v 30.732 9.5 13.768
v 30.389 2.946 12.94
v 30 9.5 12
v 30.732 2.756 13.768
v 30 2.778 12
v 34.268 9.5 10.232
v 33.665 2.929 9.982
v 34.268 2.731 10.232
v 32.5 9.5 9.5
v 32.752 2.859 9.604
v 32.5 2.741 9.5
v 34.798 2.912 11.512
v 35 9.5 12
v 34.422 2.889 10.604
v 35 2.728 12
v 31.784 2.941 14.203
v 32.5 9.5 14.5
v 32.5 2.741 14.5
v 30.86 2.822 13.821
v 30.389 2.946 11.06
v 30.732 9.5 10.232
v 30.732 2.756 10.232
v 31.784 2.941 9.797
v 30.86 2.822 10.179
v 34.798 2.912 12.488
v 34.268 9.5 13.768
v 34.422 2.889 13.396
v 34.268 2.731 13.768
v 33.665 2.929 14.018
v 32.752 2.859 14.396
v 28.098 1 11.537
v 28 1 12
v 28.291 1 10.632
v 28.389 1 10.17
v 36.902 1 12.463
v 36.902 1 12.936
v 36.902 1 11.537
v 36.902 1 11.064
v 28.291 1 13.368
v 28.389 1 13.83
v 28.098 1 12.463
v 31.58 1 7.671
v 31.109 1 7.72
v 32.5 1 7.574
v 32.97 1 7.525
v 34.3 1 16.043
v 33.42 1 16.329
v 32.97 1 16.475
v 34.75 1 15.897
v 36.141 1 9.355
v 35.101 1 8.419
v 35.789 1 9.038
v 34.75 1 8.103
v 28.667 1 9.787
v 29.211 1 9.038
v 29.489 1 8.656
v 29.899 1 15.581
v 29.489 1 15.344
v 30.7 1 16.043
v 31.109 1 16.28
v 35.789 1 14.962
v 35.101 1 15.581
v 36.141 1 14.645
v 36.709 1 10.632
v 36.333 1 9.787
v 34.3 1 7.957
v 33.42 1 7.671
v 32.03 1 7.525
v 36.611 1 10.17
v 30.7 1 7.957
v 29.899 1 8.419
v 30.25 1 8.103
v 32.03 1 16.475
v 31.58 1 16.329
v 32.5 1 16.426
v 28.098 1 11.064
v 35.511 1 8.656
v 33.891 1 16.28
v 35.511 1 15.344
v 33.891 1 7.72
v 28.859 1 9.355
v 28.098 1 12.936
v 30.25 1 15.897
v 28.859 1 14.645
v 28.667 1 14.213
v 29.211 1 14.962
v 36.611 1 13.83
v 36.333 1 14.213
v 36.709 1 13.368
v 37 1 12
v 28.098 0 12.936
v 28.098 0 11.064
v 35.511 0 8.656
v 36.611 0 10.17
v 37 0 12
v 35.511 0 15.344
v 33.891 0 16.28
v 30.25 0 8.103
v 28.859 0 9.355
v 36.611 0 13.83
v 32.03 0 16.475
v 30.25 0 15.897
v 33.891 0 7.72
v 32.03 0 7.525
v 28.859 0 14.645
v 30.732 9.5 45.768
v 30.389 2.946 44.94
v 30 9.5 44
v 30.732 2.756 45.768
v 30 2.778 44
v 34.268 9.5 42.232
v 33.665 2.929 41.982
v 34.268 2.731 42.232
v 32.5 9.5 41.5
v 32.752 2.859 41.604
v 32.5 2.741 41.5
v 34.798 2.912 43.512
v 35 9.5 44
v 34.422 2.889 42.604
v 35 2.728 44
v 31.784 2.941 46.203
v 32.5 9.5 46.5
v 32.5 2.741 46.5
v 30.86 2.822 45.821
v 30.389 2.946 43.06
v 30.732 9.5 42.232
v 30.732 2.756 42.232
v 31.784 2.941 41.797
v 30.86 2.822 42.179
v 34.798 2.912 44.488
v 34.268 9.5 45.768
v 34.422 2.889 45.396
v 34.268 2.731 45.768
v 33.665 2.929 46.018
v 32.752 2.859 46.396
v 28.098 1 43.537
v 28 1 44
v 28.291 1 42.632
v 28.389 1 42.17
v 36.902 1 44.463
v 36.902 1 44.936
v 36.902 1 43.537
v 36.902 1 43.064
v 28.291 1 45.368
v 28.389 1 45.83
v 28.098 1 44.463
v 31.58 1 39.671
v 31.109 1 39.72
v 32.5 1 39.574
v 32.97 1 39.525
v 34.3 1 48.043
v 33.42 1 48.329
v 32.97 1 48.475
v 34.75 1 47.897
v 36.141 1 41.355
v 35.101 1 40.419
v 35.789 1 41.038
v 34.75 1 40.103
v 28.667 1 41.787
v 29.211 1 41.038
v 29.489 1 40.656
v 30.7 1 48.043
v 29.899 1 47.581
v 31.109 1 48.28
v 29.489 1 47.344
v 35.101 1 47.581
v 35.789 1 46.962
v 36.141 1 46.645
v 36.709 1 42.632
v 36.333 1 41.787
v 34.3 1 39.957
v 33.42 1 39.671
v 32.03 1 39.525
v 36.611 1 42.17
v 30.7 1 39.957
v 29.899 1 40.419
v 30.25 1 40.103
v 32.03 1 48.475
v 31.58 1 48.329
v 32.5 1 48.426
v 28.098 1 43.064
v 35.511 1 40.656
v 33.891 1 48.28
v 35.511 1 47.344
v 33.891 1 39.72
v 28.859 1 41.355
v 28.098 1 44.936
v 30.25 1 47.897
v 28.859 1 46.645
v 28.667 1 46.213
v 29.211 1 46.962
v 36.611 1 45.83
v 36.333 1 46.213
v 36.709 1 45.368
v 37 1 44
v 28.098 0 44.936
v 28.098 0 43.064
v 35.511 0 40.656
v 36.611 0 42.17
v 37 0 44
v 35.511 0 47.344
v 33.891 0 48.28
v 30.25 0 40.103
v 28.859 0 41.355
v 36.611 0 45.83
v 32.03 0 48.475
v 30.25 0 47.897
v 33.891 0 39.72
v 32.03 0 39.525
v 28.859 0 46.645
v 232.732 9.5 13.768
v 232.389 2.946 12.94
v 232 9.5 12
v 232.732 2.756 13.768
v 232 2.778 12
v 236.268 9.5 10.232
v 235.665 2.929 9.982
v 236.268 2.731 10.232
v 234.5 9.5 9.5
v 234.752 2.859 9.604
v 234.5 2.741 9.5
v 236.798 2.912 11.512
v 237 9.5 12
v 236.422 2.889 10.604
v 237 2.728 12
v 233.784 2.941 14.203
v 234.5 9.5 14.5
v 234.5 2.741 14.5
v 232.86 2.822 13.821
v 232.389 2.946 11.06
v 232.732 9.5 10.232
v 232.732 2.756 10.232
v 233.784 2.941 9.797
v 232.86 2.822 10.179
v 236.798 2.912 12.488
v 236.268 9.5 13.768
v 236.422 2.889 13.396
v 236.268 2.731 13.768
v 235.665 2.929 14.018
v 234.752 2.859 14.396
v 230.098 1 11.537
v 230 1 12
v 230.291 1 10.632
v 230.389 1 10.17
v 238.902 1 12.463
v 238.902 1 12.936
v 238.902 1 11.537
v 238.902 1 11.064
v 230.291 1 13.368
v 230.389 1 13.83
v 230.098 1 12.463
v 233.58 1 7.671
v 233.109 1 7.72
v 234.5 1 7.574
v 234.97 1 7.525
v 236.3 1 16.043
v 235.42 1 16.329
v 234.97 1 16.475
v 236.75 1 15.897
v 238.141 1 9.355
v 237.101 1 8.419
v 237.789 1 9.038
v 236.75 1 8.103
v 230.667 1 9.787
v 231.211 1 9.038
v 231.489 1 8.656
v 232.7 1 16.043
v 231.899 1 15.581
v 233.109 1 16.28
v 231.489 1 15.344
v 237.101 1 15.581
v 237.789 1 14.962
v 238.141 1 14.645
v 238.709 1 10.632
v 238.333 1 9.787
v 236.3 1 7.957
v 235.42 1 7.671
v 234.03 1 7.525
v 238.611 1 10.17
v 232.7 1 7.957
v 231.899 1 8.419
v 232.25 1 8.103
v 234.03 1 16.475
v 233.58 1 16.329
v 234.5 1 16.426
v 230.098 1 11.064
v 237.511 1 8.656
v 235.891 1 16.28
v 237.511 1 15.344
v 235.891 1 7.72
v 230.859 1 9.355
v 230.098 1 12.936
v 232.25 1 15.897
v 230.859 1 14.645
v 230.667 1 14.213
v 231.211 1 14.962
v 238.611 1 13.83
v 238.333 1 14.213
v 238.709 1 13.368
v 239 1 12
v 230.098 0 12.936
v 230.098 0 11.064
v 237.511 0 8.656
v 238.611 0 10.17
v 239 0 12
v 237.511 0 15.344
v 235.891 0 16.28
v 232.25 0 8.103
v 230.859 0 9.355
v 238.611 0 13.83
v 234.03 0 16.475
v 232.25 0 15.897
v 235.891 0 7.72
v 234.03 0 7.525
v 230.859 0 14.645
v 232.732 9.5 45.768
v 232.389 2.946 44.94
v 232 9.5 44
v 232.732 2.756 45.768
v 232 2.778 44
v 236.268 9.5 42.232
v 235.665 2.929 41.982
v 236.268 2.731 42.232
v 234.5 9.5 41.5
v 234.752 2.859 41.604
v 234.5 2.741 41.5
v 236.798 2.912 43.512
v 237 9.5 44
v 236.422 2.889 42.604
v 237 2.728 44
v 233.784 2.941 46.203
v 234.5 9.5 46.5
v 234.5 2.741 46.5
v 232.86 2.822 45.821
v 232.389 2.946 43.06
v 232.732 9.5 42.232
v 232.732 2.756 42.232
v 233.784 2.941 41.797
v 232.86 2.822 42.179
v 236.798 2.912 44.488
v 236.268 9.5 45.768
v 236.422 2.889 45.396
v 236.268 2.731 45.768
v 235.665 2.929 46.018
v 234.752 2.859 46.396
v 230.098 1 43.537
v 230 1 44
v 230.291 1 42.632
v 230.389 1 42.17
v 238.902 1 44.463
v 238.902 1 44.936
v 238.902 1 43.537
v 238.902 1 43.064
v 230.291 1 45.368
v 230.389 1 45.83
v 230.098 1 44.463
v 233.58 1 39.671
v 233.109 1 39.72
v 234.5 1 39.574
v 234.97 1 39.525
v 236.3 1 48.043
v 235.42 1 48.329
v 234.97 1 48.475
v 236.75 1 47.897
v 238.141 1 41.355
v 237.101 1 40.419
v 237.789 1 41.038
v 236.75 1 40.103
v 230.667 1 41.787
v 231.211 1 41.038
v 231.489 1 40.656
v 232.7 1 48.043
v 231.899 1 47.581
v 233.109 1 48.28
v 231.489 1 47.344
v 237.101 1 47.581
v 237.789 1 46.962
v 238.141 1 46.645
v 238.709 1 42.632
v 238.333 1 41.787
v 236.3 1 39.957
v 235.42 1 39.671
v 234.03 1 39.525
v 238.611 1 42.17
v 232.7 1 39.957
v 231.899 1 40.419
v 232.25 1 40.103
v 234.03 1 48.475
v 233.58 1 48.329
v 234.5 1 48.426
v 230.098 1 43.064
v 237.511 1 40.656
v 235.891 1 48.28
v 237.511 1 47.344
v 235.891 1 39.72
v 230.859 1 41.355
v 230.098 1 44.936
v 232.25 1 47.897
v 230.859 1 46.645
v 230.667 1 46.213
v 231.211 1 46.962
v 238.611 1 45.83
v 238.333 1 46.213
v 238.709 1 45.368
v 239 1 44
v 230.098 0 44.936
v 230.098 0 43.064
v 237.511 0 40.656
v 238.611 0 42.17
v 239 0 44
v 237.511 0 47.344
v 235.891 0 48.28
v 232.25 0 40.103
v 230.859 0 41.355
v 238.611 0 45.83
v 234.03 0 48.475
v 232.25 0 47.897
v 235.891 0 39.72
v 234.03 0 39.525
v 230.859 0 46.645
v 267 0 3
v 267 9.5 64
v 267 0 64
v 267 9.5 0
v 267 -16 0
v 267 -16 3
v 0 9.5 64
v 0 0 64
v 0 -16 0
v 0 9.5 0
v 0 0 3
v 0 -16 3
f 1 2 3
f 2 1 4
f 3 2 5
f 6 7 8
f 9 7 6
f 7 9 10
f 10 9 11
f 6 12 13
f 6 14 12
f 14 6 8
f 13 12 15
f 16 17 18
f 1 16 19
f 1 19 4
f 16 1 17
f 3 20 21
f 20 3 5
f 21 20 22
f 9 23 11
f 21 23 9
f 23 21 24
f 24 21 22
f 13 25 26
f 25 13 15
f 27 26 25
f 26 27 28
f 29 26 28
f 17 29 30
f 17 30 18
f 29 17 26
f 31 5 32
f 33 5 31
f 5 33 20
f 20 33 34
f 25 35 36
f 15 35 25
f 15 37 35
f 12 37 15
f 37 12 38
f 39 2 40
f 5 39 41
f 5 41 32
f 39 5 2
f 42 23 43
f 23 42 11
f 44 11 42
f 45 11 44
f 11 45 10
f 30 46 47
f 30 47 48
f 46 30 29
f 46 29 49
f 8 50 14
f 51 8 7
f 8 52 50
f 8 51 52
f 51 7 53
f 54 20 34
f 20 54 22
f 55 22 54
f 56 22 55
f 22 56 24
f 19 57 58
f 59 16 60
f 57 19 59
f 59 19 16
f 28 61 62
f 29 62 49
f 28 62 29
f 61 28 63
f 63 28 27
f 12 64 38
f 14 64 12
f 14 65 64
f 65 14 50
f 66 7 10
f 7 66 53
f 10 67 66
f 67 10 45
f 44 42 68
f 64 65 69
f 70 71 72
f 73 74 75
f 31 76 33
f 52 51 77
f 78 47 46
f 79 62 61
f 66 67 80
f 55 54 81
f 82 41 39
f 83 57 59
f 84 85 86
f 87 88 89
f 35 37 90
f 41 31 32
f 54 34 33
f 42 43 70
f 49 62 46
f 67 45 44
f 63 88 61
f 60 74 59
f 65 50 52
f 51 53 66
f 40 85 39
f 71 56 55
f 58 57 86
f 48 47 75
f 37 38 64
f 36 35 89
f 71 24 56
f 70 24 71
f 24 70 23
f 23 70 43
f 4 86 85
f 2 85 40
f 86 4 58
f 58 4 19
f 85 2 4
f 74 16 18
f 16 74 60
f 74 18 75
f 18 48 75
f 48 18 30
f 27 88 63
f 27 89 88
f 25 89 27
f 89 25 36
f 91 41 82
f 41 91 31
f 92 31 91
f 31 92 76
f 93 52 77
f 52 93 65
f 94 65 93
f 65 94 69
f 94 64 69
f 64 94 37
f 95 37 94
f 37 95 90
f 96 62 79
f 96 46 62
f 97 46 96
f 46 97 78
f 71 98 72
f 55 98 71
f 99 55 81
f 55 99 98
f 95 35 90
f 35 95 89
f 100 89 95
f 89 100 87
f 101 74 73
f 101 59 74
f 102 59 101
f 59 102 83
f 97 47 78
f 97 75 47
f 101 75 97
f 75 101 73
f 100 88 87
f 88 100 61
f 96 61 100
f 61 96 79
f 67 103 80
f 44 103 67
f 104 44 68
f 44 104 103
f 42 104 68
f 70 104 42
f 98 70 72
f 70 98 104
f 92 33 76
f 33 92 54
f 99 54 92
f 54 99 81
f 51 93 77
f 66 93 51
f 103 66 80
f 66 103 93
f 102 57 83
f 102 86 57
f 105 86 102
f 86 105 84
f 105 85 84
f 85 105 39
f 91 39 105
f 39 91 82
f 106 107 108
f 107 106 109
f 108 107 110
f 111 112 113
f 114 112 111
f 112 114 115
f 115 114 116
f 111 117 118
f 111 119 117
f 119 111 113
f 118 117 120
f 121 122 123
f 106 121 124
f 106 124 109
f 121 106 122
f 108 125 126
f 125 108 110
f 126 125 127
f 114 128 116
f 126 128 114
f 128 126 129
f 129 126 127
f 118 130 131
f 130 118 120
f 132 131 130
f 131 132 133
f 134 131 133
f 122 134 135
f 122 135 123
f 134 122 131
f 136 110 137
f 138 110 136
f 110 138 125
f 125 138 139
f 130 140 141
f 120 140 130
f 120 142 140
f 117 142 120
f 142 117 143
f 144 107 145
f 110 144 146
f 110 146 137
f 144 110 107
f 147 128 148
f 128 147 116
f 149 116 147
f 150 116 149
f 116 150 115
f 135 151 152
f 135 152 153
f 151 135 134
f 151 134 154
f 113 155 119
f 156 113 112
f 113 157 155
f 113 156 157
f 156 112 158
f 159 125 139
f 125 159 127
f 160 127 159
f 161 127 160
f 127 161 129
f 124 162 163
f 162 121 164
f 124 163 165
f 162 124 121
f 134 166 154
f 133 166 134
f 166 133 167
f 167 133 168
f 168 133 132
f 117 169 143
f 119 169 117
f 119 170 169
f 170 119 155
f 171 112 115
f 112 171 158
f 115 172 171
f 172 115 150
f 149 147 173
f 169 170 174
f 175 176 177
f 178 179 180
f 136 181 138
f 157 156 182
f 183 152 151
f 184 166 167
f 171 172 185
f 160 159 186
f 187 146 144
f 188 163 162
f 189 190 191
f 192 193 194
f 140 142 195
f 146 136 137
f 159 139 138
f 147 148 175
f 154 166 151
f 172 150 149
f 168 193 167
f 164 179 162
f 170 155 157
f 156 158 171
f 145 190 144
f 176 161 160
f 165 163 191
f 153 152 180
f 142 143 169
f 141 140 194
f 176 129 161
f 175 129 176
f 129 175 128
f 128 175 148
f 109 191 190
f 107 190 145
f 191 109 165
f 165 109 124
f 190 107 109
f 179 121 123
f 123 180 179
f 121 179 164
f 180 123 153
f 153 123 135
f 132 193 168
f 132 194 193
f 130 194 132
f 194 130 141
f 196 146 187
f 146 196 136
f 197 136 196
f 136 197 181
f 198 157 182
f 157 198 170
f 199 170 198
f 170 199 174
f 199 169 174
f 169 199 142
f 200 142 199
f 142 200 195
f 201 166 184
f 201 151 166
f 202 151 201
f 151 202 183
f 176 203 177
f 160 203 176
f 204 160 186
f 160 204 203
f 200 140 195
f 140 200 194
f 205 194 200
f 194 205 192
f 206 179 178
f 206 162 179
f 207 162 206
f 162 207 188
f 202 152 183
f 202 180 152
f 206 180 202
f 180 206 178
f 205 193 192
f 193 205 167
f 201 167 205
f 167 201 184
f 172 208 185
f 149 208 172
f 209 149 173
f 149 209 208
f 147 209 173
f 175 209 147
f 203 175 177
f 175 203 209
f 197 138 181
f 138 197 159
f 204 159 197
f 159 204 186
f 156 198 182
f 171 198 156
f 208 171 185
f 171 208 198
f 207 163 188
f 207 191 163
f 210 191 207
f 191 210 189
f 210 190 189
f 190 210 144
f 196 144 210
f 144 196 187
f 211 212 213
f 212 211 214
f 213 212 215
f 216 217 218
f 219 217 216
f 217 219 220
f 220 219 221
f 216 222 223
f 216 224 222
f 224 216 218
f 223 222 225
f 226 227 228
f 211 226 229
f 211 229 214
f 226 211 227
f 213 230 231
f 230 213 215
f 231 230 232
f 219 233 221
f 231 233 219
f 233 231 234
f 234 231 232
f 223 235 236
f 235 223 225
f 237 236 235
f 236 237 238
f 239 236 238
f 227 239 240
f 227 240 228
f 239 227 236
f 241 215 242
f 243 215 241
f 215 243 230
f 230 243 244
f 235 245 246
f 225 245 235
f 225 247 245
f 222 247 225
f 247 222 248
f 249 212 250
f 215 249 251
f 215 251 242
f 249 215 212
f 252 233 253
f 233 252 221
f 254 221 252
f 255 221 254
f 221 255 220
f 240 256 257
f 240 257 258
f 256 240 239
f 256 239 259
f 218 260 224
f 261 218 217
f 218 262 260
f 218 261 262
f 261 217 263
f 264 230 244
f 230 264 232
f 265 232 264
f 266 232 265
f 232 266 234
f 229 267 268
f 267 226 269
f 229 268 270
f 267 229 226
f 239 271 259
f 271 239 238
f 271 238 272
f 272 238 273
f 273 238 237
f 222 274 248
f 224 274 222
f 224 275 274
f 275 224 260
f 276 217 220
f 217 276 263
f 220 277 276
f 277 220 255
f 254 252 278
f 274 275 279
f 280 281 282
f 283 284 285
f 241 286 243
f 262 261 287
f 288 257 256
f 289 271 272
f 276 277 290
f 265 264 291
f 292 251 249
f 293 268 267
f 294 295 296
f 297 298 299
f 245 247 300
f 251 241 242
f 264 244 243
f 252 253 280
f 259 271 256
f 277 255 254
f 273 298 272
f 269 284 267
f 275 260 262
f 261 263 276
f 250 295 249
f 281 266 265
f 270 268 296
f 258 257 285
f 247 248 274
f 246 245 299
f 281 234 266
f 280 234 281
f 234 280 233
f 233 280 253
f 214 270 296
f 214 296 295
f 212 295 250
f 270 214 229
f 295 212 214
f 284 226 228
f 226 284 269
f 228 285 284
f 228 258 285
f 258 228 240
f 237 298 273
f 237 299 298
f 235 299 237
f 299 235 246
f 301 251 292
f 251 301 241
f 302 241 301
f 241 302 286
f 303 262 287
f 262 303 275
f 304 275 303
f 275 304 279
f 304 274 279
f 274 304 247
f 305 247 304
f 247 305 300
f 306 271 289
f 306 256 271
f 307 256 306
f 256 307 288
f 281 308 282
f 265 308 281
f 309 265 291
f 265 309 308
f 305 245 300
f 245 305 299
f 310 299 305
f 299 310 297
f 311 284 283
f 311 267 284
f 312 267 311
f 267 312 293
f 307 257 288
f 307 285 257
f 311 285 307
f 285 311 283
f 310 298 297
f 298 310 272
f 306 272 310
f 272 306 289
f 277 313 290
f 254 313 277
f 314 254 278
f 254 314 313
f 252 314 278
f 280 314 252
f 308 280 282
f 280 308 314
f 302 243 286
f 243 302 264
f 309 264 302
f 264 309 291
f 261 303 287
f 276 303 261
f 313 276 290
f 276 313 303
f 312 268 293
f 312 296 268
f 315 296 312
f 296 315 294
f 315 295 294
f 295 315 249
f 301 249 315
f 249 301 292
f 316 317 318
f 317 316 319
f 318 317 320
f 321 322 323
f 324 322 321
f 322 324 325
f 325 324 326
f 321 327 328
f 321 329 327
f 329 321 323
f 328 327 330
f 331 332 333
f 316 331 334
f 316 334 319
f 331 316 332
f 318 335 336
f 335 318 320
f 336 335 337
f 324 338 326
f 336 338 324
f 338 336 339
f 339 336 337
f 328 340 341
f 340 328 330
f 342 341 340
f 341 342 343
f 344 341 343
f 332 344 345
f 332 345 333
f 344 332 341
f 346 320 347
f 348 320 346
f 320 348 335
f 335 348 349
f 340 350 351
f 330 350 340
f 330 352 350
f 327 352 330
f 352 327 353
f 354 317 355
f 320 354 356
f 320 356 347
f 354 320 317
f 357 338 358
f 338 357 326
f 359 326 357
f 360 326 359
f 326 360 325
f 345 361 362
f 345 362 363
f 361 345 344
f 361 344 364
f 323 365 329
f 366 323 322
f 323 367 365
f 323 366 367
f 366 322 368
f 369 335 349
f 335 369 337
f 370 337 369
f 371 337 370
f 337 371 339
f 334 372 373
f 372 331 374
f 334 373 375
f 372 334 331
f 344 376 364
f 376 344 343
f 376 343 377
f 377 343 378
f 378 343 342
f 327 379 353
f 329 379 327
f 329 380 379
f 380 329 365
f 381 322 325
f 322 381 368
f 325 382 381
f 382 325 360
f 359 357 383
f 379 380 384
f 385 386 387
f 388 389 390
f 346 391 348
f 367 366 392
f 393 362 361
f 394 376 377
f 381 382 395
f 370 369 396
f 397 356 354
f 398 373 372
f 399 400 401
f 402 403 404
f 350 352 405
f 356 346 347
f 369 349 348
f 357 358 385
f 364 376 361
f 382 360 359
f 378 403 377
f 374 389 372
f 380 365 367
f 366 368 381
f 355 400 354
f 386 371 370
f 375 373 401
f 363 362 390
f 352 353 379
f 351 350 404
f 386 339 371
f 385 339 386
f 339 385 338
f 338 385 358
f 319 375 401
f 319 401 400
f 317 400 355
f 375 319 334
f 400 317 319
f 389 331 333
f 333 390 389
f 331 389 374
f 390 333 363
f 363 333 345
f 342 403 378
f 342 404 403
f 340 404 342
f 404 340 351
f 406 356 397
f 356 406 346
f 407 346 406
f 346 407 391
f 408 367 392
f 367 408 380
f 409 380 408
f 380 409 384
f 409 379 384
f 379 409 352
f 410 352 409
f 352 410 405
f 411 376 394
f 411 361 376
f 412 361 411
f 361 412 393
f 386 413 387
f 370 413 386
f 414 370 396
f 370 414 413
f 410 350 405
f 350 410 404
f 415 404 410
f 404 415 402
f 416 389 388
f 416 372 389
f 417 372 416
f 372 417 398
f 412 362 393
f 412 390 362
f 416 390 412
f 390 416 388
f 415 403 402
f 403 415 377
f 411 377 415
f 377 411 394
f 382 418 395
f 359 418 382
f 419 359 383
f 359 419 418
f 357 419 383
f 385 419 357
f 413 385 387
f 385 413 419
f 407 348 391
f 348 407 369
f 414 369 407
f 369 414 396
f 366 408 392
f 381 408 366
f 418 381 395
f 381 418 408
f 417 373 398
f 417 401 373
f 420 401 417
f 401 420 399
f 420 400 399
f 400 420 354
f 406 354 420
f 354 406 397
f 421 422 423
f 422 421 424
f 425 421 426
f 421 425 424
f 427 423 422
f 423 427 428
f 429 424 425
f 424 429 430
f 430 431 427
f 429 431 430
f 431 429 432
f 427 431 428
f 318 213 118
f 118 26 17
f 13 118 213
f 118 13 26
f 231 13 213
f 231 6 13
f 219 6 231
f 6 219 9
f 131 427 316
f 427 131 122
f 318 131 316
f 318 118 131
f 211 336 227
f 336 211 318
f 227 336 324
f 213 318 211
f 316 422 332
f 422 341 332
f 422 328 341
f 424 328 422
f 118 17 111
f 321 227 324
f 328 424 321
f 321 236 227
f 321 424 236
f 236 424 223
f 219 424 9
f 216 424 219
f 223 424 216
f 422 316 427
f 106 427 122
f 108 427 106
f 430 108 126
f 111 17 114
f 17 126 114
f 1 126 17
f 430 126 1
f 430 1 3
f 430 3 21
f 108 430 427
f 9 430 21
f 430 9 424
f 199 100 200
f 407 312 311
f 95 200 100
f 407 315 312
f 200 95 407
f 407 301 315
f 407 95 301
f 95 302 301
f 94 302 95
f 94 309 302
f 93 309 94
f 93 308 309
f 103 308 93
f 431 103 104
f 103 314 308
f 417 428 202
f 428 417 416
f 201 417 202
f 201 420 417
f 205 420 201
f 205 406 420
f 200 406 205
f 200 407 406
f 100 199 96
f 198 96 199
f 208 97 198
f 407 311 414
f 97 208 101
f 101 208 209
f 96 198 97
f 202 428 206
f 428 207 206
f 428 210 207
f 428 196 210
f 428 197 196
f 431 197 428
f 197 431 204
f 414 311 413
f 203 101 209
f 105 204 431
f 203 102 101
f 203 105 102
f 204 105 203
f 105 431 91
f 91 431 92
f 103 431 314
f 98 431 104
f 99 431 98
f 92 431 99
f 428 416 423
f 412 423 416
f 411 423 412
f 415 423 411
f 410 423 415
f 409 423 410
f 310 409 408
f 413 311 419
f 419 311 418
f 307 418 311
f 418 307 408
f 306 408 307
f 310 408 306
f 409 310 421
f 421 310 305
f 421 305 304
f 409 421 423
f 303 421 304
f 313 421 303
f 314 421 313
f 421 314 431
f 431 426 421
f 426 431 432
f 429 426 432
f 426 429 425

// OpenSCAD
/********
 *
 */

module rail(length, drawer_height, thickness, stop_block=false)
{
  drawer_tolerance = 1;

  lip_height = 3;
  lip_width = 16;

  screw_hole_diameter = 4;
  screw_hole_tolerance = 0.5;
  screw_head_diameter = 8;
  screw_head_depth = screw_head_diameter/2;

  union() {
    side(length, thickness-drawer_tolerance, drawer_height);
    lip(length, lip_width, lip_height);
  }

  module side(length, width, height) {
    difference() {
      cube([length, width, height+lip_height], center=false);
      translate([0,0,lip_height-5.5])
      mounting_holes(length, height);
    }
  }

  module lip(length, width, height) {
    translate([0,-width,0]) cube([length, width, height], center=false);
  }

  module mounting_holes(length, height) {
    setback_from_front_edge = 36.5;
    vertical_spacing = 32;

    front_column = setback_from_front_edge - screw_hole_diameter;
    rear_column = length - setback_from_front_edge + screw_hole_diameter;
    bottom_row = height/2 - (vertical_spacing/2);
    top_row = bottom_row + vertical_spacing;

    translate([front_column,0,bottom_row]) rotate([-90,0,0]) screw_hole();
    translate([front_column,0,top_row]) rotate([-90,0,0]) screw_hole();
    translate([rear_column,0,bottom_row]) rotate([-90,0,0]) screw_hole();
    translate([rear_column,0,top_row]) rotate([-90,0,0]) screw_hole();
  }

  module screw_hole() {
    union() {
      cylinder(r=screw_hole_diameter/2+screw_hole_tolerance,h=50);
      rotate([0,180,0])
      translate([0,0,-screw_head_depth-1])
      cylinder(r1=0,r2=screw_head_diameter/2+screw_hole_tolerance,h=screw_head_depth);
      translate([0,0,-1])
      cylinder(r=screw_head_diameter/2+screw_hole_tolerance, h=2);
    }
  }
}


rail(length=267, drawer_height=32*2-3, thickness=21/2);
*translate([0,0,32*2])
%rail(length=267, drawer_height=32*2-3, thickness=21/2);
*%rail(length=267, drawer_height=56, thickness=21/2);
